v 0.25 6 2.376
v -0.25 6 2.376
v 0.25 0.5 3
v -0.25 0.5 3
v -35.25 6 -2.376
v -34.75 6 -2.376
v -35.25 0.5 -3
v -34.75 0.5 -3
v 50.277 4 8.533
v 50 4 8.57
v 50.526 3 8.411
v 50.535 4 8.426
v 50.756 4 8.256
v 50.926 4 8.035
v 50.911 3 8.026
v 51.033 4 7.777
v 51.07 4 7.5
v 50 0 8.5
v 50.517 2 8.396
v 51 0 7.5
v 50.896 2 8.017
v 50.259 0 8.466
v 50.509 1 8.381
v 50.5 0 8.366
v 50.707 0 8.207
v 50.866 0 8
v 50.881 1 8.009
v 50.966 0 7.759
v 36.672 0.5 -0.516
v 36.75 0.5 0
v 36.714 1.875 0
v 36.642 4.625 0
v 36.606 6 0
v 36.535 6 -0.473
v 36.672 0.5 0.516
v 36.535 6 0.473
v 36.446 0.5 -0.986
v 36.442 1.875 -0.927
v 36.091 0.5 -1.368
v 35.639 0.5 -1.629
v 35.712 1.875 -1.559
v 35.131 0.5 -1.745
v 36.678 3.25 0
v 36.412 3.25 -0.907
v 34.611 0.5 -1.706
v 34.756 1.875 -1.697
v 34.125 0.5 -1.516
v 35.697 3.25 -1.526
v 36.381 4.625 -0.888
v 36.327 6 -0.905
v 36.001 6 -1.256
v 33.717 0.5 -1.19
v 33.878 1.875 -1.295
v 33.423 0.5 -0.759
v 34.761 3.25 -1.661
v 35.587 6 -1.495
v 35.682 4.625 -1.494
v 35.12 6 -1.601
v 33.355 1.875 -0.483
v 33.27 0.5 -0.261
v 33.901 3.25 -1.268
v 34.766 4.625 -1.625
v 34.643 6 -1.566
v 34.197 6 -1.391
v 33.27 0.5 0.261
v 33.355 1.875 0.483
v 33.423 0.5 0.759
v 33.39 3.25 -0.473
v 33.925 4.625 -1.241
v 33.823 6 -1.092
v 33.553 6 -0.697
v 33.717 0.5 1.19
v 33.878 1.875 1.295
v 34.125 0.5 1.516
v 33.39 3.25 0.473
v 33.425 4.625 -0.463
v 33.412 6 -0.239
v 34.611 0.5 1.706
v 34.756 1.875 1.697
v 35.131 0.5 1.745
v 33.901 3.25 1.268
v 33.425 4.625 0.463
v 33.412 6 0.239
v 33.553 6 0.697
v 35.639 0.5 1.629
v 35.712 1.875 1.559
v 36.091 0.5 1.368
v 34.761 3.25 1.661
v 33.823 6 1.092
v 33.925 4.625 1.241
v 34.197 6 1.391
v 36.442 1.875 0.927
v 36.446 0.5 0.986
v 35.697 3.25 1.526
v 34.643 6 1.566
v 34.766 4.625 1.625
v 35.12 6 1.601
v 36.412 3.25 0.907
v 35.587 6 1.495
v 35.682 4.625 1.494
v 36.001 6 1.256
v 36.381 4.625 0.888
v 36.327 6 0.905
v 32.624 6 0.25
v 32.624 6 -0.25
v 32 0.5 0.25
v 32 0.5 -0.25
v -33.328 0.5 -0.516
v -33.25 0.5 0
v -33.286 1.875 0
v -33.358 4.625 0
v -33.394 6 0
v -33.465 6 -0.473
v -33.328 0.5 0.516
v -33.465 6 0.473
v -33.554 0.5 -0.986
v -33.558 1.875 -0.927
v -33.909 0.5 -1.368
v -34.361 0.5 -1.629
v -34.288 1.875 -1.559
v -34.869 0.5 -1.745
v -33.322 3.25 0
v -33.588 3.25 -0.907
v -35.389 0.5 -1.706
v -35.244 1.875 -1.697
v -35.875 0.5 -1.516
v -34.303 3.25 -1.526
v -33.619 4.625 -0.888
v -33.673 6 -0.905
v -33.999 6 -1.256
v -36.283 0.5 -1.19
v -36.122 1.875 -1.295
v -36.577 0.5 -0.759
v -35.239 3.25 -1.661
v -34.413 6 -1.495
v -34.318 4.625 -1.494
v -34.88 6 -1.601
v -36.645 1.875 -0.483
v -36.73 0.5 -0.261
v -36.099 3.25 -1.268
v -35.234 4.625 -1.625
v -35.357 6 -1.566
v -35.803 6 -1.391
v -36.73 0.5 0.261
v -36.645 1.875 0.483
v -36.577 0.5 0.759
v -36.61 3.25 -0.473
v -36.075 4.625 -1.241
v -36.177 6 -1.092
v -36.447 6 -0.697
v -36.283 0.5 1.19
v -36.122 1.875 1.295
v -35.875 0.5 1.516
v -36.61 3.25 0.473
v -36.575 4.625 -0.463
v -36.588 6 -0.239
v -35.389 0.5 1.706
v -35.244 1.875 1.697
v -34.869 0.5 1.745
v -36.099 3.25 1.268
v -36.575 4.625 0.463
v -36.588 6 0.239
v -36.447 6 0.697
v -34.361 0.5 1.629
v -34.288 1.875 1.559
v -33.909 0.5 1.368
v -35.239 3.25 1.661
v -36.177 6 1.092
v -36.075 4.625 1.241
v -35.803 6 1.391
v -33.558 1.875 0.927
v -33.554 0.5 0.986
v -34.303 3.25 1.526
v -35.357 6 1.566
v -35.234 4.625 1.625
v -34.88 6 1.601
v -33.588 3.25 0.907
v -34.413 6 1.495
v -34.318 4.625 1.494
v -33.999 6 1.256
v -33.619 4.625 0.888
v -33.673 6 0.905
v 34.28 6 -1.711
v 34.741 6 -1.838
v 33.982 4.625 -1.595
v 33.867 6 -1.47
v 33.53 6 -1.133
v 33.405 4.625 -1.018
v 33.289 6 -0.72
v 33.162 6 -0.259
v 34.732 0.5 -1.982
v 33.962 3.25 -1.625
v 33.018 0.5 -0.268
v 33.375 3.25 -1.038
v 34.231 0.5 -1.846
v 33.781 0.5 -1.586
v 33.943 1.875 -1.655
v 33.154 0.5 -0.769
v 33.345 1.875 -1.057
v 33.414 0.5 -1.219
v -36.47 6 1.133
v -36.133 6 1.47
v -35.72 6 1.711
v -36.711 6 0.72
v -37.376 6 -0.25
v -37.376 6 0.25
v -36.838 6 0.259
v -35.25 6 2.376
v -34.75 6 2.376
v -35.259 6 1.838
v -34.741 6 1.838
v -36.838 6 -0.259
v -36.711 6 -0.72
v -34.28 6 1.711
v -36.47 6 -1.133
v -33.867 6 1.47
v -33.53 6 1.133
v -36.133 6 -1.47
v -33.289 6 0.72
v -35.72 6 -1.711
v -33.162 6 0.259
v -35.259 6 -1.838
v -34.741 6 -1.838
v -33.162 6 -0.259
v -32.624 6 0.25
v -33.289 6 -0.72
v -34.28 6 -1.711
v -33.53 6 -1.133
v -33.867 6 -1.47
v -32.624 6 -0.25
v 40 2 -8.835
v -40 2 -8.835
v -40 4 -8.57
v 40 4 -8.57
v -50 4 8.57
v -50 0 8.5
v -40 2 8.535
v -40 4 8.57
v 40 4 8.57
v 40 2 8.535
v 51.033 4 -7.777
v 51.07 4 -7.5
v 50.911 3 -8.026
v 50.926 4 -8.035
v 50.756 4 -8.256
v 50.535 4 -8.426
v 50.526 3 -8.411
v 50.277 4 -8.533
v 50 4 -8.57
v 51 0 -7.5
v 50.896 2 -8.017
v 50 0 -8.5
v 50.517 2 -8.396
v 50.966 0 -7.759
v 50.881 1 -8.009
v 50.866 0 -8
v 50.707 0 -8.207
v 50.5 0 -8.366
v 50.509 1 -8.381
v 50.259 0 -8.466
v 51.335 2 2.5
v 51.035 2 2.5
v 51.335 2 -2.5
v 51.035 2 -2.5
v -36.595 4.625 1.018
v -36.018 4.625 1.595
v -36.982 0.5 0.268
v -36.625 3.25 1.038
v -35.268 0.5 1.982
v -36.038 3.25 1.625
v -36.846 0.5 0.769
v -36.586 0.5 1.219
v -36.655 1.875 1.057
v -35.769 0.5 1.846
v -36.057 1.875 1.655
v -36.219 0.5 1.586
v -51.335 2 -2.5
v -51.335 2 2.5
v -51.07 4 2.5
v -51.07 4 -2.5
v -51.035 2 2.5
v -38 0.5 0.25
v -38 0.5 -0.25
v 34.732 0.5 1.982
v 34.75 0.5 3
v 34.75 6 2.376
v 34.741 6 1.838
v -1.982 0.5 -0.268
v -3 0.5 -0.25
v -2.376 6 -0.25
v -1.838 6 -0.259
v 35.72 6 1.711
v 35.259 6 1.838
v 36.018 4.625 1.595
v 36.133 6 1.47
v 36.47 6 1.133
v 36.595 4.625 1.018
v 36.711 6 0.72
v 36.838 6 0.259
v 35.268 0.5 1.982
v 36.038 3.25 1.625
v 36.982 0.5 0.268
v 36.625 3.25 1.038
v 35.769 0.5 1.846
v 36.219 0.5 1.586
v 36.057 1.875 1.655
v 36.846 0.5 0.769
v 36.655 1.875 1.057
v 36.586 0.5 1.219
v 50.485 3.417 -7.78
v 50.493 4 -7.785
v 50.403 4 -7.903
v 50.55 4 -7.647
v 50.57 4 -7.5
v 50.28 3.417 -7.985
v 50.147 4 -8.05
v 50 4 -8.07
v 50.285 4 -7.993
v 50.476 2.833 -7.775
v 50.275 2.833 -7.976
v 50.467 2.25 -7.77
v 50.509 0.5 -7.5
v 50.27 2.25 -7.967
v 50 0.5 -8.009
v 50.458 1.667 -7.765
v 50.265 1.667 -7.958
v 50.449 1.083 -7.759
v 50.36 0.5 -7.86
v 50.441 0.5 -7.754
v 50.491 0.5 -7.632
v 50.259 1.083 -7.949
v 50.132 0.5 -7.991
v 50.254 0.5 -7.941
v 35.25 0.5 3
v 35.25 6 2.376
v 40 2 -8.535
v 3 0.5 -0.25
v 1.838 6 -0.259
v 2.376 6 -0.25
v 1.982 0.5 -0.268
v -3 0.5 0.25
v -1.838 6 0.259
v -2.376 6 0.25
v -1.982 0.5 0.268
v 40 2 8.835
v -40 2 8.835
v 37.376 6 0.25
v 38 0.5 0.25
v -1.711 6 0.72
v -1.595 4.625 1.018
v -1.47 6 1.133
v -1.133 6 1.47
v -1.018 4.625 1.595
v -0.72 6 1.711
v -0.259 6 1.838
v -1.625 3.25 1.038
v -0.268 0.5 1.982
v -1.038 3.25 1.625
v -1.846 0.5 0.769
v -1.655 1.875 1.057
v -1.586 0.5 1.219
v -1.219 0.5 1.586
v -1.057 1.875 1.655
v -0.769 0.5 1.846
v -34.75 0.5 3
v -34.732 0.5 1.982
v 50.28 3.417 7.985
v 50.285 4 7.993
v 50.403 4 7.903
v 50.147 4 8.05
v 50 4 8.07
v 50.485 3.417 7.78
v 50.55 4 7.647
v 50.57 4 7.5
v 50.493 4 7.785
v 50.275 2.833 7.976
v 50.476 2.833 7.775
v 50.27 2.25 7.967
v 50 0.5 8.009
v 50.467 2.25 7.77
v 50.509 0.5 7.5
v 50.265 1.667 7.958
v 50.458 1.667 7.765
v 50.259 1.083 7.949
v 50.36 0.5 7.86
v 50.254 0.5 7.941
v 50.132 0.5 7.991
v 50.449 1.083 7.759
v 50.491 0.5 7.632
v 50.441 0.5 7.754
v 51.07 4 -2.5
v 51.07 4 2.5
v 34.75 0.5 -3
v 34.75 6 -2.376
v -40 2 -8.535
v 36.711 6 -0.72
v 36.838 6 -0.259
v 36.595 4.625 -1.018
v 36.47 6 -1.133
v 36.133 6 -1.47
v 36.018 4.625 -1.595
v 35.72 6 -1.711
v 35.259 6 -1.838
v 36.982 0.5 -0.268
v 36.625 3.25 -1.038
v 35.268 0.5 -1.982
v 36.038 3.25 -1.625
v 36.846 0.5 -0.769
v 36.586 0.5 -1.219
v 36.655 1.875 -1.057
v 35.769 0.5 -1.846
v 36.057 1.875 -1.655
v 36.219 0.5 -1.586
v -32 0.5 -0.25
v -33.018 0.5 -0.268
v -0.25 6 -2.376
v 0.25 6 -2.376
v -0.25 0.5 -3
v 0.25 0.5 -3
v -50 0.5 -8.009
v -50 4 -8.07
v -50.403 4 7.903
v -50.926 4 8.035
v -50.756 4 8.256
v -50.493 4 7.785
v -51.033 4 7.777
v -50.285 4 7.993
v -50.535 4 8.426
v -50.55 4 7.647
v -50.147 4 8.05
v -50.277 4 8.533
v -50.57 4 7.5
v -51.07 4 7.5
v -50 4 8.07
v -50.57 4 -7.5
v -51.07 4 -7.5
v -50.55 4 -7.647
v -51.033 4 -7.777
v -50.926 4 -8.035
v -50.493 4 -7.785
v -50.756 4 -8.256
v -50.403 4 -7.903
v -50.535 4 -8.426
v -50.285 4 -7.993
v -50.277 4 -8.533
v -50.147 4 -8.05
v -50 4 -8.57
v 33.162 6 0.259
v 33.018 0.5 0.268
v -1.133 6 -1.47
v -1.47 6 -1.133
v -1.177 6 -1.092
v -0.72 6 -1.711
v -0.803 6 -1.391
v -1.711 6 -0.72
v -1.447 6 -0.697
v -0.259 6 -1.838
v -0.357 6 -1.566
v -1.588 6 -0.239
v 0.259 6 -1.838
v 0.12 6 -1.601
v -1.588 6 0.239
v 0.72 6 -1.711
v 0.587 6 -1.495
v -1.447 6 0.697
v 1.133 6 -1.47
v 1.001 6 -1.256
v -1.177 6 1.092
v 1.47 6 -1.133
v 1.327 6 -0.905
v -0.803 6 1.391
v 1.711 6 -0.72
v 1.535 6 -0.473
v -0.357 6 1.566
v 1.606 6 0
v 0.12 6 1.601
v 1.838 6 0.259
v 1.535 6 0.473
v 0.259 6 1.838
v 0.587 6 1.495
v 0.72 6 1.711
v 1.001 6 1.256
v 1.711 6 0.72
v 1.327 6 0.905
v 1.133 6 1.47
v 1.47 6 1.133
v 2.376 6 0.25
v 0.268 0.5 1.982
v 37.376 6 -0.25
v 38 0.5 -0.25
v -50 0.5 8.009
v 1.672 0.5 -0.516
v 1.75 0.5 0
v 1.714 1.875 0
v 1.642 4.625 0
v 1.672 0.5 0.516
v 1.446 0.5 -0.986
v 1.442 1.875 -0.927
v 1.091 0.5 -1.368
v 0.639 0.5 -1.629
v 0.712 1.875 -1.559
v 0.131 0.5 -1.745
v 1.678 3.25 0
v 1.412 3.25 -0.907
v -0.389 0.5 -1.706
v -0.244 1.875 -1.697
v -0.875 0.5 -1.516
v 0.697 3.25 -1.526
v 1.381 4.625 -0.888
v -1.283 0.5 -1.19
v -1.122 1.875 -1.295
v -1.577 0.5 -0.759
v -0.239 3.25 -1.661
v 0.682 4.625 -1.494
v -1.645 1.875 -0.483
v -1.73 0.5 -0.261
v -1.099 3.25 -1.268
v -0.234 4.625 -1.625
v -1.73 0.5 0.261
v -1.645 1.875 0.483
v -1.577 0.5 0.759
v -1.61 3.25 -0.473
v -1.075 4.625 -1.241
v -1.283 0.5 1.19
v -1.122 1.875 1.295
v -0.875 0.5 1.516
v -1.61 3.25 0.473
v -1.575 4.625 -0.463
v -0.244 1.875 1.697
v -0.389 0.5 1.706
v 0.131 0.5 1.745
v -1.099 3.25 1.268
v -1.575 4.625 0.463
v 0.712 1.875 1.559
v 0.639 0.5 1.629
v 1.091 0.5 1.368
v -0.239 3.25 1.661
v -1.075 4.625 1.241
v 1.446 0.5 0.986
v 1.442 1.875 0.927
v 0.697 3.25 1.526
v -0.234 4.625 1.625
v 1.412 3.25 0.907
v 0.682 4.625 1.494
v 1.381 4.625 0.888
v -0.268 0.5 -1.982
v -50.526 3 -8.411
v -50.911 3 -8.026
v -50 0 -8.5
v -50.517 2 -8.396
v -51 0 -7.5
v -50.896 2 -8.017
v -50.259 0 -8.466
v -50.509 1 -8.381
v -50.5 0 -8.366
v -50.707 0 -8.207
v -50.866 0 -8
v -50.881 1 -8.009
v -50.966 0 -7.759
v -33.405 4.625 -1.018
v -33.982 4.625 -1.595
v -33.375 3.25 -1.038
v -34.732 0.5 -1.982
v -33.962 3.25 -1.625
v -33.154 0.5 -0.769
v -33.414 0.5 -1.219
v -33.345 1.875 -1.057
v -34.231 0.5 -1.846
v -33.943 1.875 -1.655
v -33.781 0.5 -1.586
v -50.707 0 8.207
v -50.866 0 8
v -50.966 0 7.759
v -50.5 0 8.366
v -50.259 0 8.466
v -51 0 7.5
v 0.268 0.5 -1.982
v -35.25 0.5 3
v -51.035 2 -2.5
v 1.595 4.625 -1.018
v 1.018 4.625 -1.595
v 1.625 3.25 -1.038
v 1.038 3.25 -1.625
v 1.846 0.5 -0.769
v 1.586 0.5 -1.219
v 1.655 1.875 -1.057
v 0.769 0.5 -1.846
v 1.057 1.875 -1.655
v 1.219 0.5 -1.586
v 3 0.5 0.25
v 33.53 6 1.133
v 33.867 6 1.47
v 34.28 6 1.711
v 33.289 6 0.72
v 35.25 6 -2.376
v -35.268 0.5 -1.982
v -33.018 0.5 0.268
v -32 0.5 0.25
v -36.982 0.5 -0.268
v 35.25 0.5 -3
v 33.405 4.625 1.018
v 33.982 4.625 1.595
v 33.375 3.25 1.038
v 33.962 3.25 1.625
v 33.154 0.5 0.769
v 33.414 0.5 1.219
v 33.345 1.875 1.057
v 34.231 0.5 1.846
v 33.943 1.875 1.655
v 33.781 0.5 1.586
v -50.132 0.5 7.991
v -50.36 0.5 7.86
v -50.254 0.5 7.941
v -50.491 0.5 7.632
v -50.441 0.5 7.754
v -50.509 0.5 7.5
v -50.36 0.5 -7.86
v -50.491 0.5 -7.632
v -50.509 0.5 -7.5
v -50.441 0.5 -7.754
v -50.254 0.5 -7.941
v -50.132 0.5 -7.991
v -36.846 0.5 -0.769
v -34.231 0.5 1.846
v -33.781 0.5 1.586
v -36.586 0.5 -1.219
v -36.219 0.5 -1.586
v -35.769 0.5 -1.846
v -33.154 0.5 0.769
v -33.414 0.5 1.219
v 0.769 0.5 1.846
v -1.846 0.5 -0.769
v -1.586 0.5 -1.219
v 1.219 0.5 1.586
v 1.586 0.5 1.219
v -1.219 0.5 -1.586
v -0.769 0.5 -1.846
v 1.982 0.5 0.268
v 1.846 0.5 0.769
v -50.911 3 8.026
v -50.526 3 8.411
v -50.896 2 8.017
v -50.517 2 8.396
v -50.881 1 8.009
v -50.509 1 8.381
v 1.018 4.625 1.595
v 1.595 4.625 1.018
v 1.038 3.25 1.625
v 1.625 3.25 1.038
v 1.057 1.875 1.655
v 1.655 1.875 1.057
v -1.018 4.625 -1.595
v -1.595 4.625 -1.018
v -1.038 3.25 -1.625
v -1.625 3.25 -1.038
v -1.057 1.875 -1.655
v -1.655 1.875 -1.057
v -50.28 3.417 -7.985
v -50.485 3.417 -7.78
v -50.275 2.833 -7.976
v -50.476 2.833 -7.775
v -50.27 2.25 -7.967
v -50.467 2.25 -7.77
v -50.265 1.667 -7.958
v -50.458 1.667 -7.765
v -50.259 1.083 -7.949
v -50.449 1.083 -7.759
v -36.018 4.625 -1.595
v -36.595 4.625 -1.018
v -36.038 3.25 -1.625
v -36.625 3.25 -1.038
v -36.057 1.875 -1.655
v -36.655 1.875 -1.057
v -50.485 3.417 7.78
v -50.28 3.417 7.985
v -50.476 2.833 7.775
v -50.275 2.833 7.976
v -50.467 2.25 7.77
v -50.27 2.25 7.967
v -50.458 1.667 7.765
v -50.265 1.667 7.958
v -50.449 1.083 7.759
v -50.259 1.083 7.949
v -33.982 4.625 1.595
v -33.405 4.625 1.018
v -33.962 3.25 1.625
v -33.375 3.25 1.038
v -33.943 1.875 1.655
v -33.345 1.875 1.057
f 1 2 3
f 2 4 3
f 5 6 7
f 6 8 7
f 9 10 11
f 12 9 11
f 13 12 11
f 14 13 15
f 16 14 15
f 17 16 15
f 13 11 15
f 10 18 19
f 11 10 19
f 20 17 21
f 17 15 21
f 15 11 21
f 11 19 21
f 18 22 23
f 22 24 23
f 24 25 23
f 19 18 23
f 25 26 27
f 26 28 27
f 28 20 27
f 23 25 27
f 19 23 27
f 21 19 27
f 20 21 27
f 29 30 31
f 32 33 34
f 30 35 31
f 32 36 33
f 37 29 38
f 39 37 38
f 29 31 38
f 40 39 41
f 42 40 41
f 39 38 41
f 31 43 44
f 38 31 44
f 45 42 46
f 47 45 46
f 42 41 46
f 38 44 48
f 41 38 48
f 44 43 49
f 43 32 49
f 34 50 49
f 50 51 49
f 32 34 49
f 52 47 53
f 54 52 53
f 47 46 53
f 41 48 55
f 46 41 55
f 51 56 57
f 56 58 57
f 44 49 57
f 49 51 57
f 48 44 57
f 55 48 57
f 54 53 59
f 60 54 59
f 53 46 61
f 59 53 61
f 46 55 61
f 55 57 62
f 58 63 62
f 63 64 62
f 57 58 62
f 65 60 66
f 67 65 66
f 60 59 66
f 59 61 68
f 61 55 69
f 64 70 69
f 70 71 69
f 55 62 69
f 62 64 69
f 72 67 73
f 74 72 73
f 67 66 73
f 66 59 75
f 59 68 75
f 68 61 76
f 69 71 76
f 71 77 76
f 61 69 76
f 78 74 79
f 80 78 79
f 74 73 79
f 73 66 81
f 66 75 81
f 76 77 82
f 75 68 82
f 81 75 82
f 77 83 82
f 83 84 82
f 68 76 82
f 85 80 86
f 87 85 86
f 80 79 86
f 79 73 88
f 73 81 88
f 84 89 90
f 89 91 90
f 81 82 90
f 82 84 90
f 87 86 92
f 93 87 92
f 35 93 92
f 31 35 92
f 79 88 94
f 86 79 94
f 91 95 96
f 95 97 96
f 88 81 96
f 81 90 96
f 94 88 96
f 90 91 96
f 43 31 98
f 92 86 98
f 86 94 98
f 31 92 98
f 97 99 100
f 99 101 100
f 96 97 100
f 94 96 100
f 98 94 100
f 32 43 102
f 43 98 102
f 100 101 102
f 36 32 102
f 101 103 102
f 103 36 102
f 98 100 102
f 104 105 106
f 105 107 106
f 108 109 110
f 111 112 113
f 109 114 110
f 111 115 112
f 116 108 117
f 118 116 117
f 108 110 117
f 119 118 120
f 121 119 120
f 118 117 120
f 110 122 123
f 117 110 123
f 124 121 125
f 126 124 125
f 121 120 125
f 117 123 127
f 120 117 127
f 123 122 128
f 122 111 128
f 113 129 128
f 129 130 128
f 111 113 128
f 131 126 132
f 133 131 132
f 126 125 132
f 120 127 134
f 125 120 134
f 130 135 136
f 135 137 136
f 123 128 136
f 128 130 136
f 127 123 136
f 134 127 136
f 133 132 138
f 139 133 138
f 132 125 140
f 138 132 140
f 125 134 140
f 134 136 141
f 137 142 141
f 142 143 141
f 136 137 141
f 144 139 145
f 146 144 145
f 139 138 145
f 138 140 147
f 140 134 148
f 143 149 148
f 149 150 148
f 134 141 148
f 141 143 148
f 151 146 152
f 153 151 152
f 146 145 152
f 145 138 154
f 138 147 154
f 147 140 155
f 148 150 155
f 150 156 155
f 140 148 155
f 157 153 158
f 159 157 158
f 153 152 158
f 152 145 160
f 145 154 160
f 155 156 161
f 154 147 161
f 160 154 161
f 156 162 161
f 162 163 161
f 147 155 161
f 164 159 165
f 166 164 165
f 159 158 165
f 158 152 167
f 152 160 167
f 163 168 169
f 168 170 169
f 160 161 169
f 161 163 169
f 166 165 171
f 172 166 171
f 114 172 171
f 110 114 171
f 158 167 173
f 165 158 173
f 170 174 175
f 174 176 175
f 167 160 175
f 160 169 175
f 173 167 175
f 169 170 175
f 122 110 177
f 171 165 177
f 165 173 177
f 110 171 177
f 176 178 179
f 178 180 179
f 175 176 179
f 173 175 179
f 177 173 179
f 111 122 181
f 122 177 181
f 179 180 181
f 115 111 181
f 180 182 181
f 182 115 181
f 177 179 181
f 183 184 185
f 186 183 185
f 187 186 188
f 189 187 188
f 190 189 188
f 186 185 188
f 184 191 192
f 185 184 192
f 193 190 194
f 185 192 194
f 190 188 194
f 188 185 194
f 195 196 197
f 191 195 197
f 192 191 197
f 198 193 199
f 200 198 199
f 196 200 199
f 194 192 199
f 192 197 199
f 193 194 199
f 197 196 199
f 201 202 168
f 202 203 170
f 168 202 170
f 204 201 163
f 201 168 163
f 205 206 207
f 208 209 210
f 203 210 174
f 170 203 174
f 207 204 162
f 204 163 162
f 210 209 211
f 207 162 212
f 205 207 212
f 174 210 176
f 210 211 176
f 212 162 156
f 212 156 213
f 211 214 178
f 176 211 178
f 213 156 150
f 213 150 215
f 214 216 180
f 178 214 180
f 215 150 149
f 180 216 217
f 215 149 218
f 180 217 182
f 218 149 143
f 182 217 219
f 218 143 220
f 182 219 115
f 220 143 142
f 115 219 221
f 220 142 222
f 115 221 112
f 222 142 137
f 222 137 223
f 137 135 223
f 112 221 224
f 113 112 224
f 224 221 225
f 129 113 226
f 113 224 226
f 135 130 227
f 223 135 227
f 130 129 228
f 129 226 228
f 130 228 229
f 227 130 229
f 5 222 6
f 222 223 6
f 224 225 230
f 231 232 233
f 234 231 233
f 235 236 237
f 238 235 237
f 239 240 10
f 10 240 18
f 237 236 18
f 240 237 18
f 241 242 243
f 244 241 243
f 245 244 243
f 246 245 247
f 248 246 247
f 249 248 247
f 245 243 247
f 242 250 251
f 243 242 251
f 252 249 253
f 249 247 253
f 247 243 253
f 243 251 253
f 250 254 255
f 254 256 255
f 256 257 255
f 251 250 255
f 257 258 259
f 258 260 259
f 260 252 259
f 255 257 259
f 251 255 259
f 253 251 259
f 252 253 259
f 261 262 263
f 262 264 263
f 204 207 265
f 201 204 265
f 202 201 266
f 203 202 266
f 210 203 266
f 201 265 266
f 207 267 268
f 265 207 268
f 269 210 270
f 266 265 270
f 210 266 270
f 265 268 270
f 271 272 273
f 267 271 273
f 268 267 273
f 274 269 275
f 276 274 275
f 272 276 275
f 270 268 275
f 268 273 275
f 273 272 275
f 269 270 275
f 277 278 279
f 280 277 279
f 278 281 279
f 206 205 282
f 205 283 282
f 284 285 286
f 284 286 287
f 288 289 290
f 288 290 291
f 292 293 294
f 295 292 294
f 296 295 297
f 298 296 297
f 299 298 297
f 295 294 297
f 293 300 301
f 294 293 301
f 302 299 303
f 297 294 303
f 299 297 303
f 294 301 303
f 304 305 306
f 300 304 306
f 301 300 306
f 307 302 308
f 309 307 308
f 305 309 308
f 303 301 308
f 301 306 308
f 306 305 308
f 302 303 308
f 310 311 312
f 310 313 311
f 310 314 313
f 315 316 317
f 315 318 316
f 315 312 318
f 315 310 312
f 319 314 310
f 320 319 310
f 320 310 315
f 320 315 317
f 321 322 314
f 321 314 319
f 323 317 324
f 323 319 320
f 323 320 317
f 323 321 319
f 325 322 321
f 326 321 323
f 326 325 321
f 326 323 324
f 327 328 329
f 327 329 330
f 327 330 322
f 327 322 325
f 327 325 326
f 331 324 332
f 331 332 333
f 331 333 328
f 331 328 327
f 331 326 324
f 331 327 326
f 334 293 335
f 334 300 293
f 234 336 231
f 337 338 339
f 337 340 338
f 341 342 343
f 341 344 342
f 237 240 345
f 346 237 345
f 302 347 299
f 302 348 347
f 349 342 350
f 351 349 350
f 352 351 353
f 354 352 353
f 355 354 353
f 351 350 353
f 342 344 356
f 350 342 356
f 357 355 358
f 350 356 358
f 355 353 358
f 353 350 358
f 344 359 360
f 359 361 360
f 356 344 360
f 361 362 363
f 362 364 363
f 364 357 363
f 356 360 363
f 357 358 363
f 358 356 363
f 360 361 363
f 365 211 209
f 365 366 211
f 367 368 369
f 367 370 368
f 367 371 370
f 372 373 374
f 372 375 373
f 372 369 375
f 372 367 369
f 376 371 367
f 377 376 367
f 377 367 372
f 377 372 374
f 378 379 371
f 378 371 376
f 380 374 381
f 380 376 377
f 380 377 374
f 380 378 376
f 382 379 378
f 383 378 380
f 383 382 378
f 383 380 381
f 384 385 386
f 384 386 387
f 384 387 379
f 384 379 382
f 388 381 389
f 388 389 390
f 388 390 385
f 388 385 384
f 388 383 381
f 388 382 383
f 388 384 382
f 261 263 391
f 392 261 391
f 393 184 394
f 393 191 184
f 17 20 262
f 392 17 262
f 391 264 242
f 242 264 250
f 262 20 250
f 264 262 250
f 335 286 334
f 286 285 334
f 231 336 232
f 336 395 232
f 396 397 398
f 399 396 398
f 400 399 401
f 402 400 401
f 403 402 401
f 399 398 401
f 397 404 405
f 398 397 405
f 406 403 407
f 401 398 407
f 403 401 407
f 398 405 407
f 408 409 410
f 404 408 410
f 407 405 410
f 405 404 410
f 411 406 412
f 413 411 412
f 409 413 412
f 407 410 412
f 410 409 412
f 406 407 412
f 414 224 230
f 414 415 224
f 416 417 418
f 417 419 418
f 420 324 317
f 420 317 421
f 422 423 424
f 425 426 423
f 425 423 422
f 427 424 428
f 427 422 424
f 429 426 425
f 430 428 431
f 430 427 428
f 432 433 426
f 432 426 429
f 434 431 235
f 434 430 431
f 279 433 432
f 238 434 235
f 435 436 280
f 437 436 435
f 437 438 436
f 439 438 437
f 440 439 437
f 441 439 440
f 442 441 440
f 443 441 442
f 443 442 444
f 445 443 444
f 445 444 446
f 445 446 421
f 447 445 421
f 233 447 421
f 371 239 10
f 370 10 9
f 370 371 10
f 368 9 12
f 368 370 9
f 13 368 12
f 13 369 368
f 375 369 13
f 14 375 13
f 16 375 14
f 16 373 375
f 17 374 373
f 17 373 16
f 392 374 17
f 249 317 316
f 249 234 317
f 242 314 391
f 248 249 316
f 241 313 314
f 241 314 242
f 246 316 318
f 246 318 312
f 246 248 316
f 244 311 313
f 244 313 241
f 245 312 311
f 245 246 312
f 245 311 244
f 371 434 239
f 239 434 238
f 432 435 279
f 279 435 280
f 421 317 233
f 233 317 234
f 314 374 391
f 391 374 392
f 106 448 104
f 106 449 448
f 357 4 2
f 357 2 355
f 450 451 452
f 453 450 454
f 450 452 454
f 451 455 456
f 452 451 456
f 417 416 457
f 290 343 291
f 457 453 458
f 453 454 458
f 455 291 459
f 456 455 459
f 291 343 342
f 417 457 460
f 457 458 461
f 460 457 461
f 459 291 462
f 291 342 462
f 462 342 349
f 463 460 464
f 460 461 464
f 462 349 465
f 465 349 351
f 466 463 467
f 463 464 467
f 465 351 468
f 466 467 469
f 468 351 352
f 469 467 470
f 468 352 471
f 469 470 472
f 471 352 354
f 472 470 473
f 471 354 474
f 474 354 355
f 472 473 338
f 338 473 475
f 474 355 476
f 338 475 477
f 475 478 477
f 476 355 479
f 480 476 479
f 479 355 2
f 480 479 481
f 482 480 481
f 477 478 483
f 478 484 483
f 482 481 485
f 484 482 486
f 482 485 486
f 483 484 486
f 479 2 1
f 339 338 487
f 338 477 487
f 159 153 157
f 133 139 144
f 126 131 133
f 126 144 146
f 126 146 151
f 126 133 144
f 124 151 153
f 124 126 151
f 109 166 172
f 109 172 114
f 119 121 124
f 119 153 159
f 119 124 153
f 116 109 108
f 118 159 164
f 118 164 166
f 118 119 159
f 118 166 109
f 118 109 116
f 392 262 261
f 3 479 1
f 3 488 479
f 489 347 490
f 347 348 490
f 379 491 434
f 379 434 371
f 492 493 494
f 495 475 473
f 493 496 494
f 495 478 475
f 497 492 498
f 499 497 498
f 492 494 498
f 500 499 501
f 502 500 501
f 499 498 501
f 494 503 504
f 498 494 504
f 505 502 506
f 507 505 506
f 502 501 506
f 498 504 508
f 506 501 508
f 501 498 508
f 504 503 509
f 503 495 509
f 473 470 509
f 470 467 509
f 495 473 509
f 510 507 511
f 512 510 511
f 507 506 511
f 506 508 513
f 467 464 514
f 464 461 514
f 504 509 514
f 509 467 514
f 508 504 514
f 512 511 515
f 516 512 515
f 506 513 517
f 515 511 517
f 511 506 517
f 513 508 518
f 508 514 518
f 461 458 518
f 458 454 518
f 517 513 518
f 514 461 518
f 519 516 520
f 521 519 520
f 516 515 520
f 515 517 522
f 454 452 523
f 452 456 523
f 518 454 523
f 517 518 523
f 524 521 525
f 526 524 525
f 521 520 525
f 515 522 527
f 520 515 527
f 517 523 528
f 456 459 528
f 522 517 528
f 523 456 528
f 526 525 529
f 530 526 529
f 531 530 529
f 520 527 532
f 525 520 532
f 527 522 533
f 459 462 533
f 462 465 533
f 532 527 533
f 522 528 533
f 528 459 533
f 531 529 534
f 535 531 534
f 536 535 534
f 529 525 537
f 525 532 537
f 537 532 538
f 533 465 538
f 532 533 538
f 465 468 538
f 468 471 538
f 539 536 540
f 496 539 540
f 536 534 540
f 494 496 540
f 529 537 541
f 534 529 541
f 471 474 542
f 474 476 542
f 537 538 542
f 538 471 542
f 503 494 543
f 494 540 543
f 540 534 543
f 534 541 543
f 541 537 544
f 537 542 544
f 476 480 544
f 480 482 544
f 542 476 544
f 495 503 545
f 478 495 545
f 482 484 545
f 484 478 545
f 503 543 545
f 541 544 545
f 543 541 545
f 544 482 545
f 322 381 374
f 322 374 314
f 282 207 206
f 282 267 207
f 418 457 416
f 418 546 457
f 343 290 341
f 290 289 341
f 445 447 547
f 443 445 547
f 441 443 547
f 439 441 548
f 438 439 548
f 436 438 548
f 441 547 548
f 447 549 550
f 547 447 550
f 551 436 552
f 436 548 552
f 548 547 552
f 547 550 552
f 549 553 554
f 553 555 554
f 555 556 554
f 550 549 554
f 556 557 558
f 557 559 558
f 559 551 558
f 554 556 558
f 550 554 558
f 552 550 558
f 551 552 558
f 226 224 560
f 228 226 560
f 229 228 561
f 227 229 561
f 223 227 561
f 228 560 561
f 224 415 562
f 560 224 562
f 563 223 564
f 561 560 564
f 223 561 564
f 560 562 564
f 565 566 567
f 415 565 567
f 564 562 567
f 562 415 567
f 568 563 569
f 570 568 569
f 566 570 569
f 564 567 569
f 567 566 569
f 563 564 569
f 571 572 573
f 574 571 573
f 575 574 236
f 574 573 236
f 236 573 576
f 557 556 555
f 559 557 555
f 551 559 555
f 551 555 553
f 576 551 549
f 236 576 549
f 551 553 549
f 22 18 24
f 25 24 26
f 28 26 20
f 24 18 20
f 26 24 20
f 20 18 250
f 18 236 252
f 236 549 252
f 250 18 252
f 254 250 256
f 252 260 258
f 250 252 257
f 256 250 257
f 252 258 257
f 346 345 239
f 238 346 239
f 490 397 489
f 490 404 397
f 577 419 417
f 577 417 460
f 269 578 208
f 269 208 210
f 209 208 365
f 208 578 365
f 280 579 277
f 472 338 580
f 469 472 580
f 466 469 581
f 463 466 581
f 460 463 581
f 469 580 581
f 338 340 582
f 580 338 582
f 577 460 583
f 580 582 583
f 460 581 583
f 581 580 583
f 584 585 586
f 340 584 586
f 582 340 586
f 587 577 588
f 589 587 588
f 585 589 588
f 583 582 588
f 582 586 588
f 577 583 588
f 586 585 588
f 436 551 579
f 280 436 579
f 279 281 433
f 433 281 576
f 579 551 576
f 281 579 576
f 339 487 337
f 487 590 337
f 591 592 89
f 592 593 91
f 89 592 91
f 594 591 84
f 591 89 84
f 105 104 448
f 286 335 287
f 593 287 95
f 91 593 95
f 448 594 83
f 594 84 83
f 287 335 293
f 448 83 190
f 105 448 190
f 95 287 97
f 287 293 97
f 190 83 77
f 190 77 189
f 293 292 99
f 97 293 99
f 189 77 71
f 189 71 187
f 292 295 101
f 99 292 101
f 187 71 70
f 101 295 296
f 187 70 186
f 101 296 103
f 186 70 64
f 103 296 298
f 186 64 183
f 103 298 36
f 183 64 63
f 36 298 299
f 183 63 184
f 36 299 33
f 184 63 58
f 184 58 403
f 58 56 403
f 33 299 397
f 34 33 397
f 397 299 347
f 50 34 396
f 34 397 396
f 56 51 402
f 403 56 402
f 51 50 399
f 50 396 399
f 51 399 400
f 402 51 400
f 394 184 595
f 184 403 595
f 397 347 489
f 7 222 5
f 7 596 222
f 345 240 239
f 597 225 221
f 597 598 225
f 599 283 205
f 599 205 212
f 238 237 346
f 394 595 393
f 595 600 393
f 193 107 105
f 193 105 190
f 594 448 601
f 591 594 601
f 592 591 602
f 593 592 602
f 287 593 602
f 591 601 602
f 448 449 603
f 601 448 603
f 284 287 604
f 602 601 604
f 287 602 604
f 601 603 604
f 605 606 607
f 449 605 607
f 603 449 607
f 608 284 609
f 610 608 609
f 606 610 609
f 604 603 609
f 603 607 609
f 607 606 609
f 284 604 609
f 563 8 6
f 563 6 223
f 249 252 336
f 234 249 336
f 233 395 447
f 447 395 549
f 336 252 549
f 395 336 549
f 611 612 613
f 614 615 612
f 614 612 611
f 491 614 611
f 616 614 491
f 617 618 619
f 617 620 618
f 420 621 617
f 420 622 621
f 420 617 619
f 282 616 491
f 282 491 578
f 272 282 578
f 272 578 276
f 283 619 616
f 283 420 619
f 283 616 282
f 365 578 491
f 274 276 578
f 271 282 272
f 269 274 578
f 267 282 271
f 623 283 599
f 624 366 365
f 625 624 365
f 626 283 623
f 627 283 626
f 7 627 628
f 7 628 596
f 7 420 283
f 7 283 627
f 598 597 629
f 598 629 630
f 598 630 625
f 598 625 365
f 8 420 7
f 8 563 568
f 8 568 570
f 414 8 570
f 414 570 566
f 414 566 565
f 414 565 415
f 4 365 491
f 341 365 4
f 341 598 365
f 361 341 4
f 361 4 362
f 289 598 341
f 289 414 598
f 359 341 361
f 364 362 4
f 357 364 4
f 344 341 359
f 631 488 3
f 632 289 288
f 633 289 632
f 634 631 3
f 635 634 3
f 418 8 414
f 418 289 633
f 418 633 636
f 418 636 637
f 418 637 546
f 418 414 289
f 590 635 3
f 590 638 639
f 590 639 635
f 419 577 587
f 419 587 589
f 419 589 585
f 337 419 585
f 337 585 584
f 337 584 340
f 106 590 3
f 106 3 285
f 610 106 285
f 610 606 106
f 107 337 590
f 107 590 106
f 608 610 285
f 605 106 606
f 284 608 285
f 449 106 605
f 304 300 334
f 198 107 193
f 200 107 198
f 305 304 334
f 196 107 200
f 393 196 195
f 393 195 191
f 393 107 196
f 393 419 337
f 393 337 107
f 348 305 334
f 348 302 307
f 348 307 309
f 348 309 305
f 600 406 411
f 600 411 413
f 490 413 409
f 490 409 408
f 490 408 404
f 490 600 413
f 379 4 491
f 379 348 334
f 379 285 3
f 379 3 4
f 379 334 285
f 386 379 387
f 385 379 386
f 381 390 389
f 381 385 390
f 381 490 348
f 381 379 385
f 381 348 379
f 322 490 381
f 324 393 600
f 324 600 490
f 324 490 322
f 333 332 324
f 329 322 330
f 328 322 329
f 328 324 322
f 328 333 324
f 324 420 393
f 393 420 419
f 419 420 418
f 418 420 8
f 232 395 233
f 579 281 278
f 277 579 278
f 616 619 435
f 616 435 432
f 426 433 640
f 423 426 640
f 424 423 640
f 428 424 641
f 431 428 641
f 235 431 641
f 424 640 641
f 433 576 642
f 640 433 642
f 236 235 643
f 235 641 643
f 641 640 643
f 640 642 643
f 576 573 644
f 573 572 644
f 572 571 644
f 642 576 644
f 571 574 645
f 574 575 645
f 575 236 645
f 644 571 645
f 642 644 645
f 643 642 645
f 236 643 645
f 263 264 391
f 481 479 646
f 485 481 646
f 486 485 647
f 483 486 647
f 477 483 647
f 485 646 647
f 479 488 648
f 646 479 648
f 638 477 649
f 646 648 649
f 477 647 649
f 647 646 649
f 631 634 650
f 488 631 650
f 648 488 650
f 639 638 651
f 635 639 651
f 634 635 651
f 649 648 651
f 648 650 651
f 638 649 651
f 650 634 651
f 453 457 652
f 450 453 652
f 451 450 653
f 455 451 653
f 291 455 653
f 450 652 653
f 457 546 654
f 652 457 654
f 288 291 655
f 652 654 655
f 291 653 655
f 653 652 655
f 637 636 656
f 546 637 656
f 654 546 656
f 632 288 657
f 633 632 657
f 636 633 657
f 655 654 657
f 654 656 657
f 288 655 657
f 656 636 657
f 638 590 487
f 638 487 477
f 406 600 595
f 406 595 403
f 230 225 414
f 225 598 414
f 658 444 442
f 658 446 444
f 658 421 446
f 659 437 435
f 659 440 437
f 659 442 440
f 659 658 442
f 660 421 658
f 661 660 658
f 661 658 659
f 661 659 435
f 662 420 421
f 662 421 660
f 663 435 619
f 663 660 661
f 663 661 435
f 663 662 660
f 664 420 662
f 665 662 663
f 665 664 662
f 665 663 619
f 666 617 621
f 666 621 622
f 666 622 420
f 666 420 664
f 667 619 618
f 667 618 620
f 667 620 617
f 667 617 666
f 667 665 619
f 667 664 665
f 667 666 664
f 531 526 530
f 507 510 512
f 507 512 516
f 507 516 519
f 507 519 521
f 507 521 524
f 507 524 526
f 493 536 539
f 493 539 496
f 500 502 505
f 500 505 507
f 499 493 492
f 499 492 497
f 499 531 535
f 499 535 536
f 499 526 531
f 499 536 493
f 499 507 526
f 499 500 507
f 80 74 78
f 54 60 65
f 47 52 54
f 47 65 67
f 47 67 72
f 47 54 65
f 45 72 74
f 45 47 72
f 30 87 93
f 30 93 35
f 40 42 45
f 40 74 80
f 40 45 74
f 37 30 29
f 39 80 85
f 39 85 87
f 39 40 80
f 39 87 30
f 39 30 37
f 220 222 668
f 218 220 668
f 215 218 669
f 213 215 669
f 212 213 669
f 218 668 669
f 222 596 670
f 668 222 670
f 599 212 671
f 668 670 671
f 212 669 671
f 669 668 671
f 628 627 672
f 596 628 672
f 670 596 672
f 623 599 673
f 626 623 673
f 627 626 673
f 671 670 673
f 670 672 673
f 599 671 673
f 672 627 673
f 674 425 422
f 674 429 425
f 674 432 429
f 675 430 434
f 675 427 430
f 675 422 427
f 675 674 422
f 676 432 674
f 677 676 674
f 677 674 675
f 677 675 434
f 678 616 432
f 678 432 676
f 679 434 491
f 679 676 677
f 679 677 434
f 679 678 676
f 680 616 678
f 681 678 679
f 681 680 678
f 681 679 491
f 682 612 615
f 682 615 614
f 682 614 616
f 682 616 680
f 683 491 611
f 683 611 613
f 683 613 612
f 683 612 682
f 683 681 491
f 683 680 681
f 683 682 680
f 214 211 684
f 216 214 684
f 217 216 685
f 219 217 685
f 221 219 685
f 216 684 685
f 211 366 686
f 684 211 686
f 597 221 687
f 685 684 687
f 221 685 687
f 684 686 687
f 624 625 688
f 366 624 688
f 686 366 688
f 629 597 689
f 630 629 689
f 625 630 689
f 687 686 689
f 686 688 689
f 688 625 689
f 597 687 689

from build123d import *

# Parameters (mm, degrees)
BOSS_EXTRUDE1_DEPTH           = 4
BOSS_EXTRUDE1_DRAFT           = -1
SHELL1_T                      = -0.5
SKETCH2_R                     = 2
BOSS_EXTRUDE2_DEPTH           = 5.5
BOSS_EXTRUDE2_DRAFT           = 1.5
BOSS_EXTRUDE2_PROFILE_2_DEPTH = 5.5
BOSS_EXTRUDE2_PROFILE_2_DRAFT = 1.5
BOSS_EXTRUDE2_PROFILE_3_DEPTH = 5.5
BOSS_EXTRUDE2_PROFILE_3_DRAFT = 1.5
CIRPATTERN1_COUNT             = 4
SKETCH6_R                     = 1.605977431
CUT_EXTRUDE1_DEPTH            = 5.5
CUT_EXTRUDE1_DRAFT            = 1.5
CUT_EXTRUDE1_PROFILE_2_DEPTH  = 5.5
CUT_EXTRUDE1_PROFILE_2_DRAFT  = 1.5
CUT_EXTRUDE1_PROFILE_3_DEPTH  = 5.5
CUT_EXTRUDE1_PROFILE_3_DRAFT  = 1.5
BOSS_EXTRUDE3_DEPTH           = 2.5
BOSS_EXTRUDE4_DEPTH           = 40


with BuildPart() as part:
    # Sketch1 → Boss-Extrude1 (with draft: the straight prism first)
    with BuildSketch(Plane(origin=(0, 0, 0), x_dir=(1, 0, 0), z_dir=(0, 1, 0))):
        with BuildLine():
            Line((-50, -8.5), (50, -8.5))
            ThreePointArc((50, -8.5), (50.707106781, -8.207106781), (51, -7.5))
            Line((51, -7.5), (51, 7.5))
            ThreePointArc((51, 7.5), (50.707106781, 8.207106781), (50, 8.5))
            Line((50, 8.5), (-50, 8.5))
            ThreePointArc((-50, 8.5), (-50.707106781, 8.207106781), (-51, 7.5))
            Line((-51, 7.5), (-51, -7.5))
            ThreePointArc((-51, -7.5), (-50.707106781, -8.207106781), (-50, -8.5))
        make_face()
    extrude(amount=BOSS_EXTRUDE1_DEPTH)
    # Boss-Extrude1: the draft: its side faces are tilted about the plane it starts from
    boss_extrude1_sides = [part.faces().sort_by_distance(p)[0] for p in [
        (0, 2, 8.5),
        (50.707106781, 2, 8.207106781),
        (51, 2, 0),
        (50.707106781, 2, -8.207106781),
        (0, 2, -8.5),
        (-50.707106781, 2, -8.207106781),
        (-51, 2, 0),
        (-50.707106781, 2, 8.207106781),
    ]]
    draft(boss_extrude1_sides, Plane(origin=(0, 0, 0), x_dir=(1, 0, 0), z_dir=(0, 1, 0)), BOSS_EXTRUDE1_DRAFT)

    # Shell1
    shell1_openings = [part.faces().sort_by_distance(p)[0] for p in [
        (0, 4, 0),
    ]]
    offset(amount=SHELL1_T, openings=shell1_openings, kind=Kind.INTERSECTION)


with BuildPart() as boss_extrude2_tool:
    # Sketch2 → Boss-Extrude2 (with draft: the straight prism first)
    with BuildSketch(Plane(origin=(0, 0.5, 0), x_dir=(1, 0, 0), z_dir=(0, 1, 0))):
        with Locations((35, 0)):
            Circle(SKETCH2_R)
    extrude(amount=BOSS_EXTRUDE2_DEPTH)
    # Boss-Extrude2: the draft: its side faces are tilted about the plane it starts from
    boss_extrude2_sides = [boss_extrude2_tool.faces().sort_by_distance(p)[0] for p in [
        (33, 3.25, 0),
    ]]
    draft(boss_extrude2_sides, Plane(origin=(0, 0.5, 0), x_dir=(1, 0, 0), z_dir=(0, 1, 0)), BOSS_EXTRUDE2_DRAFT)


with BuildPart() as part_1:
    add(part.part)

    # Boss-Extrude2: add boss_extrude2_tool
    add(boss_extrude2_tool.part)


with BuildPart() as boss_extrude2_profile_2_tool:
    # Sketch2 → Boss-Extrude2 profile 2 (with draft: the straight prism first)
    with BuildSketch(Plane(origin=(0, 0.5, 0), x_dir=(1, 0, 0), z_dir=(0, 1, 0))):
        Circle(SKETCH2_R)
    extrude(amount=BOSS_EXTRUDE2_PROFILE_2_DEPTH)
    # Boss-Extrude2 profile 2: the draft: its side faces are tilted about the plane it starts from
    boss_extrude2_profile_2_sides = [boss_extrude2_profile_2_tool.faces().sort_by_distance(p)[0] for p in [
        (-2, 3.25, 0),
    ]]
    draft(boss_extrude2_profile_2_sides, Plane(origin=(0, 0.5, 0), x_dir=(1, 0, 0), z_dir=(0, 1, 0)), BOSS_EXTRUDE2_PROFILE_2_DRAFT)


with BuildPart() as part_2:
    add(part_1.part)

    # Boss-Extrude2 profile 2: add boss_extrude2_profile_2_tool
    add(boss_extrude2_profile_2_tool.part)


with BuildPart() as boss_extrude2_profile_3_tool:
    # Sketch2 → Boss-Extrude2 profile 3 (with draft: the straight prism first)
    with BuildSketch(Plane(origin=(0, 0.5, 0), x_dir=(1, 0, 0), z_dir=(0, 1, 0))):
        with Locations((-35, 0)):
            Circle(SKETCH2_R)
    extrude(amount=BOSS_EXTRUDE2_PROFILE_3_DEPTH)
    # Boss-Extrude2 profile 3: the draft: its side faces are tilted about the plane it starts from
    boss_extrude2_profile_3_sides = [boss_extrude2_profile_3_tool.faces().sort_by_distance(p)[0] for p in [
        (-37, 3.25, 0),
    ]]
    draft(boss_extrude2_profile_3_sides, Plane(origin=(0, 0.5, 0), x_dir=(1, 0, 0), z_dir=(0, 1, 0)), BOSS_EXTRUDE2_PROFILE_3_DRAFT)


with BuildPart() as part_3:
    add(part_2.part)

    # Boss-Extrude2 profile 3: add boss_extrude2_profile_3_tool
    add(boss_extrude2_profile_3_tool.part)

    # Rib1: read off the stored shape, not the designer's step
    # Rib1: loft between two sections, ruled curve by curve
    rib1_from = [
        Edge.make_line((-1.837769145, 6, 0.259339154), (-2.376238774, 6, 0.25)),
        Edge.make_line((-2.376238774, 6, -0.25), (-1.837769145, 6, -0.259339154)),
        Edge.make_line((-2.376238774, 6, -0.25), (-2.376238774, 6, 0.25)),
        Edge.make_line((-1.837769145, 6, -0.259339154), (-1.837769145, 6, 0.259339154)),
    ]
    rib1_to = [
        Edge.make_line((-1.98200916, 0.5, 0.267655913), (-3, 0.5, 0.25)),
        Edge.make_line((-3, 0.5, -0.25), (-1.98200916, 0.5, -0.267655913)),
        Edge.make_line((-3, 0.5, -0.25), (-3, 0.5, 0.25)),
        Edge.make_line((-1.98200916, 0.5, -0.267655913), (-1.98200916, 0.5, 0.267655913)),
    ]
    rib1 = Solid(Shell([*[Face.make_surface_from_curves(rib1_from[k], rib1_to[k]) for k in range(4)], Face(Wire(rib1_from)), Face(Wire(rib1_to))]))
    add(rib1)

    # CirPattern1: Rib1 ×4 about axis
    cirpattern1_axis = Axis((0, 0, 0), (0, 1, 0))
    for i in range(1, CIRPATTERN1_COUNT):
        add(rib1.rotate(cirpattern1_axis, i * 360 / CIRPATTERN1_COUNT))

    # LPattern3: read off the stored shape, not the designer's step
    # LPattern3: loft between two sections, ruled curve by curve
    lpattern3_from = [
        Edge.make_line((34.75, 6, 2.376238774), (35.25, 6, 2.376238774)),
        Edge.make_line((35.259339154, 6, 1.837769145), (35.25, 6, 2.376238774)),
        Edge.make_line((34.75, 6, 2.376238774), (34.740660846, 6, 1.837769145)),
        Edge.make_line((34.740660846, 6, 1.837769145), (35.259339154, 6, 1.837769145)),
    ]
    lpattern3_to = [
        Edge.make_line((34.75, 0.5, 3), (35.25, 0.5, 3)),
        Edge.make_line((35.267655913, 0.5, 1.98200916), (35.25, 0.5, 3)),
        Edge.make_line((34.75, 0.5, 3), (34.732344087, 0.5, 1.98200916)),
        Edge.make_line((34.732344087, 0.5, 1.98200916), (35.267655913, 0.5, 1.98200916)),
    ]
    lpattern3 = Solid(Shell([*[Face.make_surface_from_curves(lpattern3_from[k], lpattern3_to[k]) for k in range(4)], Face(Wire(lpattern3_from)), Face(Wire(lpattern3_to))]))
    add(lpattern3)

    # LPattern3 2: loft between two sections, ruled curve by curve
    lpattern3_2_from = [
        Edge.make_line((35.25, 6, -2.376238774), (34.75, 6, -2.376238774)),
        Edge.make_line((34.740660846, 6, -1.837769145), (34.75, 6, -2.376238774)),
        Edge.make_line((35.25, 6, -2.376238774), (35.259339154, 6, -1.837769145)),
        Edge.make_line((35.259339154, 6, -1.837769145), (34.740660846, 6, -1.837769145)),
    ]
    lpattern3_2_to = [
        Edge.make_line((35.25, 0.5, -3), (34.75, 0.5, -3)),
        Edge.make_line((34.732344087, 0.5, -1.98200916), (34.75, 0.5, -3)),
        Edge.make_line((35.25, 0.5, -3), (35.267655913, 0.5, -1.98200916)),
        Edge.make_line((35.267655913, 0.5, -1.98200916), (34.732344087, 0.5, -1.98200916)),
    ]
    lpattern3_2 = Solid(Shell([*[Face.make_surface_from_curves(lpattern3_2_from[k], lpattern3_2_to[k]) for k in range(4)], Face(Wire(lpattern3_2_from)), Face(Wire(lpattern3_2_to))]))
    add(lpattern3_2)

    # LPattern3 3: loft between two sections, ruled curve by curve
    lpattern3_3_from = [
        Edge.make_line((33.162230855, 6, 0.259339154), (32.623761226, 6, 0.25)),
        Edge.make_line((32.623761226, 6, -0.25), (33.162230855, 6, -0.259339154)),
        Edge.make_line((32.623761226, 6, -0.25), (32.623761226, 6, 0.25)),
        Edge.make_line((33.162230855, 6, -0.259339154), (33.162230855, 6, 0.259339154)),
    ]
    lpattern3_3_to = [
        Edge.make_line((33.01799084, 0.5, 0.267655913), (32, 0.5, 0.25)),
        Edge.make_line((32, 0.5, -0.25), (33.01799084, 0.5, -0.267655913)),
        Edge.make_line((32, 0.5, -0.25), (32, 0.5, 0.25)),
        Edge.make_line((33.01799084, 0.5, -0.267655913), (33.01799084, 0.5, 0.267655913)),
    ]
    lpattern3_3 = Solid(Shell([*[Face.make_surface_from_curves(lpattern3_3_from[k], lpattern3_3_to[k]) for k in range(4)], Face(Wire(lpattern3_3_from)), Face(Wire(lpattern3_3_to))]))
    add(lpattern3_3)

    # LPattern3 4: loft between two sections, ruled curve by curve
    lpattern3_4_from = [
        Edge.make_line((36.837769145, 6, -0.259339154), (37.376238774, 6, -0.25)),
        Edge.make_line((37.376238774, 6, 0.25), (36.837769145, 6, 0.259339154)),
        Edge.make_line((37.376238774, 6, 0.25), (37.376238774, 6, -0.25)),
        Edge.make_line((36.837769145, 6, 0.259339154), (36.837769145, 6, -0.259339154)),
    ]
    lpattern3_4_to = [
        Edge.make_line((36.98200916, 0.5, -0.267655913), (38, 0.5, -0.25)),
        Edge.make_line((38, 0.5, 0.25), (36.98200916, 0.5, 0.267655913)),
        Edge.make_line((38, 0.5, 0.25), (38, 0.5, -0.25)),
        Edge.make_line((36.98200916, 0.5, 0.267655913), (36.98200916, 0.5, -0.267655913)),
    ]
    lpattern3_4 = Solid(Shell([*[Face.make_surface_from_curves(lpattern3_4_from[k], lpattern3_4_to[k]) for k in range(4)], Face(Wire(lpattern3_4_from)), Face(Wire(lpattern3_4_to))]))
    add(lpattern3_4)

    # LPattern5: read off the stored shape, not the designer's step
    # LPattern5: loft between two sections, ruled curve by curve
    lpattern5_from = [
        Edge.make_line((-35.25, 6, 2.376238774), (-34.75, 6, 2.376238774)),
        Edge.make_line((-34.740660846, 6, 1.837769145), (-34.75, 6, 2.376238774)),
        Edge.make_line((-35.25, 6, 2.376238774), (-35.259339154, 6, 1.837769145)),
        Edge.make_line((-35.259339154, 6, 1.837769145), (-34.740660846, 6, 1.837769145)),
    ]
    lpattern5_to = [
        Edge.make_line((-35.25, 0.5, 3), (-34.75, 0.5, 3)),
        Edge.make_line((-34.732344087, 0.5, 1.98200916), (-34.75, 0.5, 3)),
        Edge.make_line((-35.25, 0.5, 3), (-35.267655913, 0.5, 1.98200916)),
        Edge.make_line((-35.267655913, 0.5, 1.98200916), (-34.732344087, 0.5, 1.98200916)),
    ]
    lpattern5 = Solid(Shell([*[Face.make_surface_from_curves(lpattern5_from[k], lpattern5_to[k]) for k in range(4)], Face(Wire(lpattern5_from)), Face(Wire(lpattern5_to))]))
    add(lpattern5)

    # LPattern5 2: loft between two sections, ruled curve by curve
    lpattern5_2_from = [
        Edge.make_line((-34.75, 6, -2.376238774), (-35.25, 6, -2.376238774)),
        Edge.make_line((-35.259339154, 6, -1.837769145), (-35.25, 6, -2.376238774)),
        Edge.make_line((-34.75, 6, -2.376238774), (-34.740660846, 6, -1.837769145)),
        Edge.make_line((-34.740660846, 6, -1.837769145), (-35.259339154, 6, -1.837769145)),
    ]
    lpattern5_2_to = [
        Edge.make_line((-34.75, 0.5, -3), (-35.25, 0.5, -3)),
        Edge.make_line((-35.267655913, 0.5, -1.98200916), (-35.25, 0.5, -3)),
        Edge.make_line((-34.75, 0.5, -3), (-34.732344087, 0.5, -1.98200916)),
        Edge.make_line((-34.732344087, 0.5, -1.98200916), (-35.267655913, 0.5, -1.98200916)),
    ]
    lpattern5_2 = Solid(Shell([*[Face.make_surface_from_curves(lpattern5_2_from[k], lpattern5_2_to[k]) for k in range(4)], Face(Wire(lpattern5_2_from)), Face(Wire(lpattern5_2_to))]))
    add(lpattern5_2)

    # LPattern5 3: loft between two sections, ruled curve by curve
    lpattern5_3_from = [
        Edge.make_line((-36.837769145, 6, 0.259339154), (-37.376238774, 6, 0.25)),
        Edge.make_line((-37.376238774, 6, -0.25), (-36.837769145, 6, -0.259339154)),
        Edge.make_line((-37.376238774, 6, -0.25), (-37.376238774, 6, 0.25)),
        Edge.make_line((-36.837769145, 6, -0.259339154), (-36.837769145, 6, 0.259339154)),
    ]
    lpattern5_3_to = [
        Edge.make_line((-36.98200916, 0.5, 0.267655913), (-38, 0.5, 0.25)),
        Edge.make_line((-38, 0.5, -0.25), (-36.98200916, 0.5, -0.267655913)),
        Edge.make_line((-38, 0.5, -0.25), (-38, 0.5, 0.25)),
        Edge.make_line((-36.98200916, 0.5, -0.267655913), (-36.98200916, 0.5, 0.267655913)),
    ]
    lpattern5_3 = Solid(Shell([*[Face.make_surface_from_curves(lpattern5_3_from[k], lpattern5_3_to[k]) for k in range(4)], Face(Wire(lpattern5_3_from)), Face(Wire(lpattern5_3_to))]))
    add(lpattern5_3)

    # LPattern5 4: loft between two sections, ruled curve by curve
    lpattern5_4_from = [
        Edge.make_line((-33.162230855, 6, -0.259339154), (-32.623761226, 6, -0.25)),
        Edge.make_line((-32.623761226, 6, 0.25), (-33.162230855, 6, 0.259339154)),
        Edge.make_line((-32.623761226, 6, 0.25), (-32.623761226, 6, -0.25)),
        Edge.make_line((-33.162230855, 6, 0.259339154), (-33.162230855, 6, -0.259339154)),
    ]
    lpattern5_4_to = [
        Edge.make_line((-33.01799084, 0.5, -0.267655913), (-32, 0.5, -0.25)),
        Edge.make_line((-32, 0.5, 0.25), (-33.01799084, 0.5, 0.267655913)),
        Edge.make_line((-32, 0.5, 0.25), (-32, 0.5, -0.25)),
        Edge.make_line((-33.01799084, 0.5, 0.267655913), (-33.01799084, 0.5, -0.267655913)),
    ]
    lpattern5_4 = Solid(Shell([*[Face.make_surface_from_curves(lpattern5_4_from[k], lpattern5_4_to[k]) for k in range(4)], Face(Wire(lpattern5_4_from)), Face(Wire(lpattern5_4_to))]))
    add(lpattern5_4)


with BuildPart() as cut_extrude1_tool:
    # Sketch6 → Cut-Extrude1 (with draft: the straight prism first)
    with BuildSketch(Plane(origin=(0, 6, 0), x_dir=(1, 0, 0), z_dir=(0, 1, 0))):
        with Locations((-35, 0)):
            Circle(SKETCH6_R)
    extrude(amount=-CUT_EXTRUDE1_DEPTH)
    # Cut-Extrude1: the draft: its side faces are tilted about the plane it starts from
    cut_extrude1_sides = [cut_extrude1_tool.faces().sort_by_distance(p)[0] for p in [
        (-36.605977431, 3.25, 0),
    ]]
    draft(cut_extrude1_sides, Plane(origin=(0, 6, 0), x_dir=(1, 0, 0), z_dir=(0, 1, 0)), CUT_EXTRUDE1_DRAFT)


with BuildPart() as part_4:
    add(part_3.part)

    # Cut-Extrude1: cut by cut_extrude1_tool
    add(cut_extrude1_tool.part, mode=Mode.SUBTRACT)


with BuildPart() as cut_extrude1_profile_2_tool:
    # Sketch6 → Cut-Extrude1 profile 2 (with draft: the straight prism first)
    with BuildSketch(Plane(origin=(0, 6, 0), x_dir=(1, 0, 0), z_dir=(0, 1, 0))):
        Circle(SKETCH6_R)
    extrude(amount=-CUT_EXTRUDE1_PROFILE_2_DEPTH)
    # Cut-Extrude1 profile 2: the draft: its side faces are tilted about the plane it starts from
    cut_extrude1_profile_2_sides = [cut_extrude1_profile_2_tool.faces().sort_by_distance(p)[0] for p in [
        (-1.605977431, 3.25, 0),
    ]]
    draft(cut_extrude1_profile_2_sides, Plane(origin=(0, 6, 0), x_dir=(1, 0, 0), z_dir=(0, 1, 0)), CUT_EXTRUDE1_PROFILE_2_DRAFT)


with BuildPart() as part_5:
    add(part_4.part)

    # Cut-Extrude1 profile 2: cut by cut_extrude1_profile_2_tool
    add(cut_extrude1_profile_2_tool.part, mode=Mode.SUBTRACT)


with BuildPart() as cut_extrude1_profile_3_tool:
    # Sketch6 → Cut-Extrude1 profile 3 (with draft: the straight prism first)
    with BuildSketch(Plane(origin=(0, 6, 0), x_dir=(1, 0, 0), z_dir=(0, 1, 0))):
        with Locations((35, 0)):
            Circle(SKETCH6_R)
    extrude(amount=-CUT_EXTRUDE1_PROFILE_3_DEPTH)
    # Cut-Extrude1 profile 3: the draft: its side faces are tilted about the plane it starts from
    cut_extrude1_profile_3_sides = [cut_extrude1_profile_3_tool.faces().sort_by_distance(p)[0] for p in [
        (33.394022569, 3.25, 0),
    ]]
    draft(cut_extrude1_profile_3_sides, Plane(origin=(0, 6, 0), x_dir=(1, 0, 0), z_dir=(0, 1, 0)), CUT_EXTRUDE1_PROFILE_3_DRAFT)


with BuildPart() as part_6:
    add(part_5.part)

    # Cut-Extrude1 profile 3: cut by cut_extrude1_profile_3_tool
    add(cut_extrude1_profile_3_tool.part, mode=Mode.SUBTRACT)

    # Sketch7 → Boss-Extrude3 (add, symmetric)
    with BuildSketch(Plane.XY):
        Polygon((51.06982026, 4), (51.03491013, 2), (51.33491013, 2), align=None)
        Polygon((-51.33491013, 2), (-51.06982026, 4), (-51.03491013, 2), align=None)
    extrude(amount=BOSS_EXTRUDE3_DEPTH, both=True)

    # Sketch8 → Boss-Extrude4 (add, symmetric)
    with BuildSketch(Plane(origin=(0, 0, 0), x_dir=(0, 0, -1), z_dir=(1, 0, 0))):
        Polygon((8.56982026, 4), (8.53491013, 2), (8.83491013, 2), align=None)
        Polygon((-8.83491013, 2), (-8.56982026, 4), (-8.53491013, 2), align=None)
    extrude(amount=BOSS_EXTRUDE4_DEPTH, both=True)


solid = part_6.part
